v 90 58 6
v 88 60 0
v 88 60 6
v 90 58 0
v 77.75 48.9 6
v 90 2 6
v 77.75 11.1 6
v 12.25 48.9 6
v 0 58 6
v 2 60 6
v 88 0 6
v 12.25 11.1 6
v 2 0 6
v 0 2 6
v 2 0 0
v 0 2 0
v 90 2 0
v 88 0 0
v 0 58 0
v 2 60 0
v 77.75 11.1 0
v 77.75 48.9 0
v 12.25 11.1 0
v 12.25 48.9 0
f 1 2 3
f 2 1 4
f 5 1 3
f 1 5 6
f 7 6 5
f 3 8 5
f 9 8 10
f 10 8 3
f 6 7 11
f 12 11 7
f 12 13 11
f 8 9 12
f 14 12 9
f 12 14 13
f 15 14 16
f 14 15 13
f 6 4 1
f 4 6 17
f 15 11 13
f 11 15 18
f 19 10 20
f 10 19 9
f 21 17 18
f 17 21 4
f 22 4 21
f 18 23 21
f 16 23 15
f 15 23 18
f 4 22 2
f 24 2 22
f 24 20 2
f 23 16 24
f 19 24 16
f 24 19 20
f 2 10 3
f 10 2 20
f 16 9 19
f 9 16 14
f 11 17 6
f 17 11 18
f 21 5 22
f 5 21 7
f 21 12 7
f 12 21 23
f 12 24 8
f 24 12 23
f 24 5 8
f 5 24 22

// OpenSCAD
$fn = 32;

// ----------------------------------------------------------------------
// Windowed plate: 1 voids, 90 x 60 x 6 mm
// ----------------------------------------------------------------------

// --- parameters (mm) ---
plate_l = 90;             // plate length, X
plate_w = 60;             // plate width, Y
plate_t = 6;              // plate thickness, Z
edge_margin = 8;          // wall from the plate edge to any window
win1_l = 65.5;            // window length
win1_w = 37.8;            // window width
depth_1 = 6;              // depth of void 1 (full thickness = through)
corner_c = 2;             // corner chamfer of the plate
fit_tol = 0.1;            // declared fit tolerance (prompt contract)
free_tol = 0.5;           // declared free tolerance (prompt contract)

profile = [[2, 0], [88, 0], [90, 2], [90, 58], [88, 60], [2, 60], [0, 58], [0, 2]];  // primary outline, 8 points, counter clockwise
void_1 = [[12.25, 11.1], [77.75, 11.1], [77.75, 48.9], [12.25, 48.9]];  // large central window, 4 points

// --- the one profile operation ---
difference() {
  linear_extrude(height = plate_t) polygon(points = profile);
  translate([0, 0, -1])
    linear_extrude(height = plate_t + 2) polygon(points = void_1);
}
